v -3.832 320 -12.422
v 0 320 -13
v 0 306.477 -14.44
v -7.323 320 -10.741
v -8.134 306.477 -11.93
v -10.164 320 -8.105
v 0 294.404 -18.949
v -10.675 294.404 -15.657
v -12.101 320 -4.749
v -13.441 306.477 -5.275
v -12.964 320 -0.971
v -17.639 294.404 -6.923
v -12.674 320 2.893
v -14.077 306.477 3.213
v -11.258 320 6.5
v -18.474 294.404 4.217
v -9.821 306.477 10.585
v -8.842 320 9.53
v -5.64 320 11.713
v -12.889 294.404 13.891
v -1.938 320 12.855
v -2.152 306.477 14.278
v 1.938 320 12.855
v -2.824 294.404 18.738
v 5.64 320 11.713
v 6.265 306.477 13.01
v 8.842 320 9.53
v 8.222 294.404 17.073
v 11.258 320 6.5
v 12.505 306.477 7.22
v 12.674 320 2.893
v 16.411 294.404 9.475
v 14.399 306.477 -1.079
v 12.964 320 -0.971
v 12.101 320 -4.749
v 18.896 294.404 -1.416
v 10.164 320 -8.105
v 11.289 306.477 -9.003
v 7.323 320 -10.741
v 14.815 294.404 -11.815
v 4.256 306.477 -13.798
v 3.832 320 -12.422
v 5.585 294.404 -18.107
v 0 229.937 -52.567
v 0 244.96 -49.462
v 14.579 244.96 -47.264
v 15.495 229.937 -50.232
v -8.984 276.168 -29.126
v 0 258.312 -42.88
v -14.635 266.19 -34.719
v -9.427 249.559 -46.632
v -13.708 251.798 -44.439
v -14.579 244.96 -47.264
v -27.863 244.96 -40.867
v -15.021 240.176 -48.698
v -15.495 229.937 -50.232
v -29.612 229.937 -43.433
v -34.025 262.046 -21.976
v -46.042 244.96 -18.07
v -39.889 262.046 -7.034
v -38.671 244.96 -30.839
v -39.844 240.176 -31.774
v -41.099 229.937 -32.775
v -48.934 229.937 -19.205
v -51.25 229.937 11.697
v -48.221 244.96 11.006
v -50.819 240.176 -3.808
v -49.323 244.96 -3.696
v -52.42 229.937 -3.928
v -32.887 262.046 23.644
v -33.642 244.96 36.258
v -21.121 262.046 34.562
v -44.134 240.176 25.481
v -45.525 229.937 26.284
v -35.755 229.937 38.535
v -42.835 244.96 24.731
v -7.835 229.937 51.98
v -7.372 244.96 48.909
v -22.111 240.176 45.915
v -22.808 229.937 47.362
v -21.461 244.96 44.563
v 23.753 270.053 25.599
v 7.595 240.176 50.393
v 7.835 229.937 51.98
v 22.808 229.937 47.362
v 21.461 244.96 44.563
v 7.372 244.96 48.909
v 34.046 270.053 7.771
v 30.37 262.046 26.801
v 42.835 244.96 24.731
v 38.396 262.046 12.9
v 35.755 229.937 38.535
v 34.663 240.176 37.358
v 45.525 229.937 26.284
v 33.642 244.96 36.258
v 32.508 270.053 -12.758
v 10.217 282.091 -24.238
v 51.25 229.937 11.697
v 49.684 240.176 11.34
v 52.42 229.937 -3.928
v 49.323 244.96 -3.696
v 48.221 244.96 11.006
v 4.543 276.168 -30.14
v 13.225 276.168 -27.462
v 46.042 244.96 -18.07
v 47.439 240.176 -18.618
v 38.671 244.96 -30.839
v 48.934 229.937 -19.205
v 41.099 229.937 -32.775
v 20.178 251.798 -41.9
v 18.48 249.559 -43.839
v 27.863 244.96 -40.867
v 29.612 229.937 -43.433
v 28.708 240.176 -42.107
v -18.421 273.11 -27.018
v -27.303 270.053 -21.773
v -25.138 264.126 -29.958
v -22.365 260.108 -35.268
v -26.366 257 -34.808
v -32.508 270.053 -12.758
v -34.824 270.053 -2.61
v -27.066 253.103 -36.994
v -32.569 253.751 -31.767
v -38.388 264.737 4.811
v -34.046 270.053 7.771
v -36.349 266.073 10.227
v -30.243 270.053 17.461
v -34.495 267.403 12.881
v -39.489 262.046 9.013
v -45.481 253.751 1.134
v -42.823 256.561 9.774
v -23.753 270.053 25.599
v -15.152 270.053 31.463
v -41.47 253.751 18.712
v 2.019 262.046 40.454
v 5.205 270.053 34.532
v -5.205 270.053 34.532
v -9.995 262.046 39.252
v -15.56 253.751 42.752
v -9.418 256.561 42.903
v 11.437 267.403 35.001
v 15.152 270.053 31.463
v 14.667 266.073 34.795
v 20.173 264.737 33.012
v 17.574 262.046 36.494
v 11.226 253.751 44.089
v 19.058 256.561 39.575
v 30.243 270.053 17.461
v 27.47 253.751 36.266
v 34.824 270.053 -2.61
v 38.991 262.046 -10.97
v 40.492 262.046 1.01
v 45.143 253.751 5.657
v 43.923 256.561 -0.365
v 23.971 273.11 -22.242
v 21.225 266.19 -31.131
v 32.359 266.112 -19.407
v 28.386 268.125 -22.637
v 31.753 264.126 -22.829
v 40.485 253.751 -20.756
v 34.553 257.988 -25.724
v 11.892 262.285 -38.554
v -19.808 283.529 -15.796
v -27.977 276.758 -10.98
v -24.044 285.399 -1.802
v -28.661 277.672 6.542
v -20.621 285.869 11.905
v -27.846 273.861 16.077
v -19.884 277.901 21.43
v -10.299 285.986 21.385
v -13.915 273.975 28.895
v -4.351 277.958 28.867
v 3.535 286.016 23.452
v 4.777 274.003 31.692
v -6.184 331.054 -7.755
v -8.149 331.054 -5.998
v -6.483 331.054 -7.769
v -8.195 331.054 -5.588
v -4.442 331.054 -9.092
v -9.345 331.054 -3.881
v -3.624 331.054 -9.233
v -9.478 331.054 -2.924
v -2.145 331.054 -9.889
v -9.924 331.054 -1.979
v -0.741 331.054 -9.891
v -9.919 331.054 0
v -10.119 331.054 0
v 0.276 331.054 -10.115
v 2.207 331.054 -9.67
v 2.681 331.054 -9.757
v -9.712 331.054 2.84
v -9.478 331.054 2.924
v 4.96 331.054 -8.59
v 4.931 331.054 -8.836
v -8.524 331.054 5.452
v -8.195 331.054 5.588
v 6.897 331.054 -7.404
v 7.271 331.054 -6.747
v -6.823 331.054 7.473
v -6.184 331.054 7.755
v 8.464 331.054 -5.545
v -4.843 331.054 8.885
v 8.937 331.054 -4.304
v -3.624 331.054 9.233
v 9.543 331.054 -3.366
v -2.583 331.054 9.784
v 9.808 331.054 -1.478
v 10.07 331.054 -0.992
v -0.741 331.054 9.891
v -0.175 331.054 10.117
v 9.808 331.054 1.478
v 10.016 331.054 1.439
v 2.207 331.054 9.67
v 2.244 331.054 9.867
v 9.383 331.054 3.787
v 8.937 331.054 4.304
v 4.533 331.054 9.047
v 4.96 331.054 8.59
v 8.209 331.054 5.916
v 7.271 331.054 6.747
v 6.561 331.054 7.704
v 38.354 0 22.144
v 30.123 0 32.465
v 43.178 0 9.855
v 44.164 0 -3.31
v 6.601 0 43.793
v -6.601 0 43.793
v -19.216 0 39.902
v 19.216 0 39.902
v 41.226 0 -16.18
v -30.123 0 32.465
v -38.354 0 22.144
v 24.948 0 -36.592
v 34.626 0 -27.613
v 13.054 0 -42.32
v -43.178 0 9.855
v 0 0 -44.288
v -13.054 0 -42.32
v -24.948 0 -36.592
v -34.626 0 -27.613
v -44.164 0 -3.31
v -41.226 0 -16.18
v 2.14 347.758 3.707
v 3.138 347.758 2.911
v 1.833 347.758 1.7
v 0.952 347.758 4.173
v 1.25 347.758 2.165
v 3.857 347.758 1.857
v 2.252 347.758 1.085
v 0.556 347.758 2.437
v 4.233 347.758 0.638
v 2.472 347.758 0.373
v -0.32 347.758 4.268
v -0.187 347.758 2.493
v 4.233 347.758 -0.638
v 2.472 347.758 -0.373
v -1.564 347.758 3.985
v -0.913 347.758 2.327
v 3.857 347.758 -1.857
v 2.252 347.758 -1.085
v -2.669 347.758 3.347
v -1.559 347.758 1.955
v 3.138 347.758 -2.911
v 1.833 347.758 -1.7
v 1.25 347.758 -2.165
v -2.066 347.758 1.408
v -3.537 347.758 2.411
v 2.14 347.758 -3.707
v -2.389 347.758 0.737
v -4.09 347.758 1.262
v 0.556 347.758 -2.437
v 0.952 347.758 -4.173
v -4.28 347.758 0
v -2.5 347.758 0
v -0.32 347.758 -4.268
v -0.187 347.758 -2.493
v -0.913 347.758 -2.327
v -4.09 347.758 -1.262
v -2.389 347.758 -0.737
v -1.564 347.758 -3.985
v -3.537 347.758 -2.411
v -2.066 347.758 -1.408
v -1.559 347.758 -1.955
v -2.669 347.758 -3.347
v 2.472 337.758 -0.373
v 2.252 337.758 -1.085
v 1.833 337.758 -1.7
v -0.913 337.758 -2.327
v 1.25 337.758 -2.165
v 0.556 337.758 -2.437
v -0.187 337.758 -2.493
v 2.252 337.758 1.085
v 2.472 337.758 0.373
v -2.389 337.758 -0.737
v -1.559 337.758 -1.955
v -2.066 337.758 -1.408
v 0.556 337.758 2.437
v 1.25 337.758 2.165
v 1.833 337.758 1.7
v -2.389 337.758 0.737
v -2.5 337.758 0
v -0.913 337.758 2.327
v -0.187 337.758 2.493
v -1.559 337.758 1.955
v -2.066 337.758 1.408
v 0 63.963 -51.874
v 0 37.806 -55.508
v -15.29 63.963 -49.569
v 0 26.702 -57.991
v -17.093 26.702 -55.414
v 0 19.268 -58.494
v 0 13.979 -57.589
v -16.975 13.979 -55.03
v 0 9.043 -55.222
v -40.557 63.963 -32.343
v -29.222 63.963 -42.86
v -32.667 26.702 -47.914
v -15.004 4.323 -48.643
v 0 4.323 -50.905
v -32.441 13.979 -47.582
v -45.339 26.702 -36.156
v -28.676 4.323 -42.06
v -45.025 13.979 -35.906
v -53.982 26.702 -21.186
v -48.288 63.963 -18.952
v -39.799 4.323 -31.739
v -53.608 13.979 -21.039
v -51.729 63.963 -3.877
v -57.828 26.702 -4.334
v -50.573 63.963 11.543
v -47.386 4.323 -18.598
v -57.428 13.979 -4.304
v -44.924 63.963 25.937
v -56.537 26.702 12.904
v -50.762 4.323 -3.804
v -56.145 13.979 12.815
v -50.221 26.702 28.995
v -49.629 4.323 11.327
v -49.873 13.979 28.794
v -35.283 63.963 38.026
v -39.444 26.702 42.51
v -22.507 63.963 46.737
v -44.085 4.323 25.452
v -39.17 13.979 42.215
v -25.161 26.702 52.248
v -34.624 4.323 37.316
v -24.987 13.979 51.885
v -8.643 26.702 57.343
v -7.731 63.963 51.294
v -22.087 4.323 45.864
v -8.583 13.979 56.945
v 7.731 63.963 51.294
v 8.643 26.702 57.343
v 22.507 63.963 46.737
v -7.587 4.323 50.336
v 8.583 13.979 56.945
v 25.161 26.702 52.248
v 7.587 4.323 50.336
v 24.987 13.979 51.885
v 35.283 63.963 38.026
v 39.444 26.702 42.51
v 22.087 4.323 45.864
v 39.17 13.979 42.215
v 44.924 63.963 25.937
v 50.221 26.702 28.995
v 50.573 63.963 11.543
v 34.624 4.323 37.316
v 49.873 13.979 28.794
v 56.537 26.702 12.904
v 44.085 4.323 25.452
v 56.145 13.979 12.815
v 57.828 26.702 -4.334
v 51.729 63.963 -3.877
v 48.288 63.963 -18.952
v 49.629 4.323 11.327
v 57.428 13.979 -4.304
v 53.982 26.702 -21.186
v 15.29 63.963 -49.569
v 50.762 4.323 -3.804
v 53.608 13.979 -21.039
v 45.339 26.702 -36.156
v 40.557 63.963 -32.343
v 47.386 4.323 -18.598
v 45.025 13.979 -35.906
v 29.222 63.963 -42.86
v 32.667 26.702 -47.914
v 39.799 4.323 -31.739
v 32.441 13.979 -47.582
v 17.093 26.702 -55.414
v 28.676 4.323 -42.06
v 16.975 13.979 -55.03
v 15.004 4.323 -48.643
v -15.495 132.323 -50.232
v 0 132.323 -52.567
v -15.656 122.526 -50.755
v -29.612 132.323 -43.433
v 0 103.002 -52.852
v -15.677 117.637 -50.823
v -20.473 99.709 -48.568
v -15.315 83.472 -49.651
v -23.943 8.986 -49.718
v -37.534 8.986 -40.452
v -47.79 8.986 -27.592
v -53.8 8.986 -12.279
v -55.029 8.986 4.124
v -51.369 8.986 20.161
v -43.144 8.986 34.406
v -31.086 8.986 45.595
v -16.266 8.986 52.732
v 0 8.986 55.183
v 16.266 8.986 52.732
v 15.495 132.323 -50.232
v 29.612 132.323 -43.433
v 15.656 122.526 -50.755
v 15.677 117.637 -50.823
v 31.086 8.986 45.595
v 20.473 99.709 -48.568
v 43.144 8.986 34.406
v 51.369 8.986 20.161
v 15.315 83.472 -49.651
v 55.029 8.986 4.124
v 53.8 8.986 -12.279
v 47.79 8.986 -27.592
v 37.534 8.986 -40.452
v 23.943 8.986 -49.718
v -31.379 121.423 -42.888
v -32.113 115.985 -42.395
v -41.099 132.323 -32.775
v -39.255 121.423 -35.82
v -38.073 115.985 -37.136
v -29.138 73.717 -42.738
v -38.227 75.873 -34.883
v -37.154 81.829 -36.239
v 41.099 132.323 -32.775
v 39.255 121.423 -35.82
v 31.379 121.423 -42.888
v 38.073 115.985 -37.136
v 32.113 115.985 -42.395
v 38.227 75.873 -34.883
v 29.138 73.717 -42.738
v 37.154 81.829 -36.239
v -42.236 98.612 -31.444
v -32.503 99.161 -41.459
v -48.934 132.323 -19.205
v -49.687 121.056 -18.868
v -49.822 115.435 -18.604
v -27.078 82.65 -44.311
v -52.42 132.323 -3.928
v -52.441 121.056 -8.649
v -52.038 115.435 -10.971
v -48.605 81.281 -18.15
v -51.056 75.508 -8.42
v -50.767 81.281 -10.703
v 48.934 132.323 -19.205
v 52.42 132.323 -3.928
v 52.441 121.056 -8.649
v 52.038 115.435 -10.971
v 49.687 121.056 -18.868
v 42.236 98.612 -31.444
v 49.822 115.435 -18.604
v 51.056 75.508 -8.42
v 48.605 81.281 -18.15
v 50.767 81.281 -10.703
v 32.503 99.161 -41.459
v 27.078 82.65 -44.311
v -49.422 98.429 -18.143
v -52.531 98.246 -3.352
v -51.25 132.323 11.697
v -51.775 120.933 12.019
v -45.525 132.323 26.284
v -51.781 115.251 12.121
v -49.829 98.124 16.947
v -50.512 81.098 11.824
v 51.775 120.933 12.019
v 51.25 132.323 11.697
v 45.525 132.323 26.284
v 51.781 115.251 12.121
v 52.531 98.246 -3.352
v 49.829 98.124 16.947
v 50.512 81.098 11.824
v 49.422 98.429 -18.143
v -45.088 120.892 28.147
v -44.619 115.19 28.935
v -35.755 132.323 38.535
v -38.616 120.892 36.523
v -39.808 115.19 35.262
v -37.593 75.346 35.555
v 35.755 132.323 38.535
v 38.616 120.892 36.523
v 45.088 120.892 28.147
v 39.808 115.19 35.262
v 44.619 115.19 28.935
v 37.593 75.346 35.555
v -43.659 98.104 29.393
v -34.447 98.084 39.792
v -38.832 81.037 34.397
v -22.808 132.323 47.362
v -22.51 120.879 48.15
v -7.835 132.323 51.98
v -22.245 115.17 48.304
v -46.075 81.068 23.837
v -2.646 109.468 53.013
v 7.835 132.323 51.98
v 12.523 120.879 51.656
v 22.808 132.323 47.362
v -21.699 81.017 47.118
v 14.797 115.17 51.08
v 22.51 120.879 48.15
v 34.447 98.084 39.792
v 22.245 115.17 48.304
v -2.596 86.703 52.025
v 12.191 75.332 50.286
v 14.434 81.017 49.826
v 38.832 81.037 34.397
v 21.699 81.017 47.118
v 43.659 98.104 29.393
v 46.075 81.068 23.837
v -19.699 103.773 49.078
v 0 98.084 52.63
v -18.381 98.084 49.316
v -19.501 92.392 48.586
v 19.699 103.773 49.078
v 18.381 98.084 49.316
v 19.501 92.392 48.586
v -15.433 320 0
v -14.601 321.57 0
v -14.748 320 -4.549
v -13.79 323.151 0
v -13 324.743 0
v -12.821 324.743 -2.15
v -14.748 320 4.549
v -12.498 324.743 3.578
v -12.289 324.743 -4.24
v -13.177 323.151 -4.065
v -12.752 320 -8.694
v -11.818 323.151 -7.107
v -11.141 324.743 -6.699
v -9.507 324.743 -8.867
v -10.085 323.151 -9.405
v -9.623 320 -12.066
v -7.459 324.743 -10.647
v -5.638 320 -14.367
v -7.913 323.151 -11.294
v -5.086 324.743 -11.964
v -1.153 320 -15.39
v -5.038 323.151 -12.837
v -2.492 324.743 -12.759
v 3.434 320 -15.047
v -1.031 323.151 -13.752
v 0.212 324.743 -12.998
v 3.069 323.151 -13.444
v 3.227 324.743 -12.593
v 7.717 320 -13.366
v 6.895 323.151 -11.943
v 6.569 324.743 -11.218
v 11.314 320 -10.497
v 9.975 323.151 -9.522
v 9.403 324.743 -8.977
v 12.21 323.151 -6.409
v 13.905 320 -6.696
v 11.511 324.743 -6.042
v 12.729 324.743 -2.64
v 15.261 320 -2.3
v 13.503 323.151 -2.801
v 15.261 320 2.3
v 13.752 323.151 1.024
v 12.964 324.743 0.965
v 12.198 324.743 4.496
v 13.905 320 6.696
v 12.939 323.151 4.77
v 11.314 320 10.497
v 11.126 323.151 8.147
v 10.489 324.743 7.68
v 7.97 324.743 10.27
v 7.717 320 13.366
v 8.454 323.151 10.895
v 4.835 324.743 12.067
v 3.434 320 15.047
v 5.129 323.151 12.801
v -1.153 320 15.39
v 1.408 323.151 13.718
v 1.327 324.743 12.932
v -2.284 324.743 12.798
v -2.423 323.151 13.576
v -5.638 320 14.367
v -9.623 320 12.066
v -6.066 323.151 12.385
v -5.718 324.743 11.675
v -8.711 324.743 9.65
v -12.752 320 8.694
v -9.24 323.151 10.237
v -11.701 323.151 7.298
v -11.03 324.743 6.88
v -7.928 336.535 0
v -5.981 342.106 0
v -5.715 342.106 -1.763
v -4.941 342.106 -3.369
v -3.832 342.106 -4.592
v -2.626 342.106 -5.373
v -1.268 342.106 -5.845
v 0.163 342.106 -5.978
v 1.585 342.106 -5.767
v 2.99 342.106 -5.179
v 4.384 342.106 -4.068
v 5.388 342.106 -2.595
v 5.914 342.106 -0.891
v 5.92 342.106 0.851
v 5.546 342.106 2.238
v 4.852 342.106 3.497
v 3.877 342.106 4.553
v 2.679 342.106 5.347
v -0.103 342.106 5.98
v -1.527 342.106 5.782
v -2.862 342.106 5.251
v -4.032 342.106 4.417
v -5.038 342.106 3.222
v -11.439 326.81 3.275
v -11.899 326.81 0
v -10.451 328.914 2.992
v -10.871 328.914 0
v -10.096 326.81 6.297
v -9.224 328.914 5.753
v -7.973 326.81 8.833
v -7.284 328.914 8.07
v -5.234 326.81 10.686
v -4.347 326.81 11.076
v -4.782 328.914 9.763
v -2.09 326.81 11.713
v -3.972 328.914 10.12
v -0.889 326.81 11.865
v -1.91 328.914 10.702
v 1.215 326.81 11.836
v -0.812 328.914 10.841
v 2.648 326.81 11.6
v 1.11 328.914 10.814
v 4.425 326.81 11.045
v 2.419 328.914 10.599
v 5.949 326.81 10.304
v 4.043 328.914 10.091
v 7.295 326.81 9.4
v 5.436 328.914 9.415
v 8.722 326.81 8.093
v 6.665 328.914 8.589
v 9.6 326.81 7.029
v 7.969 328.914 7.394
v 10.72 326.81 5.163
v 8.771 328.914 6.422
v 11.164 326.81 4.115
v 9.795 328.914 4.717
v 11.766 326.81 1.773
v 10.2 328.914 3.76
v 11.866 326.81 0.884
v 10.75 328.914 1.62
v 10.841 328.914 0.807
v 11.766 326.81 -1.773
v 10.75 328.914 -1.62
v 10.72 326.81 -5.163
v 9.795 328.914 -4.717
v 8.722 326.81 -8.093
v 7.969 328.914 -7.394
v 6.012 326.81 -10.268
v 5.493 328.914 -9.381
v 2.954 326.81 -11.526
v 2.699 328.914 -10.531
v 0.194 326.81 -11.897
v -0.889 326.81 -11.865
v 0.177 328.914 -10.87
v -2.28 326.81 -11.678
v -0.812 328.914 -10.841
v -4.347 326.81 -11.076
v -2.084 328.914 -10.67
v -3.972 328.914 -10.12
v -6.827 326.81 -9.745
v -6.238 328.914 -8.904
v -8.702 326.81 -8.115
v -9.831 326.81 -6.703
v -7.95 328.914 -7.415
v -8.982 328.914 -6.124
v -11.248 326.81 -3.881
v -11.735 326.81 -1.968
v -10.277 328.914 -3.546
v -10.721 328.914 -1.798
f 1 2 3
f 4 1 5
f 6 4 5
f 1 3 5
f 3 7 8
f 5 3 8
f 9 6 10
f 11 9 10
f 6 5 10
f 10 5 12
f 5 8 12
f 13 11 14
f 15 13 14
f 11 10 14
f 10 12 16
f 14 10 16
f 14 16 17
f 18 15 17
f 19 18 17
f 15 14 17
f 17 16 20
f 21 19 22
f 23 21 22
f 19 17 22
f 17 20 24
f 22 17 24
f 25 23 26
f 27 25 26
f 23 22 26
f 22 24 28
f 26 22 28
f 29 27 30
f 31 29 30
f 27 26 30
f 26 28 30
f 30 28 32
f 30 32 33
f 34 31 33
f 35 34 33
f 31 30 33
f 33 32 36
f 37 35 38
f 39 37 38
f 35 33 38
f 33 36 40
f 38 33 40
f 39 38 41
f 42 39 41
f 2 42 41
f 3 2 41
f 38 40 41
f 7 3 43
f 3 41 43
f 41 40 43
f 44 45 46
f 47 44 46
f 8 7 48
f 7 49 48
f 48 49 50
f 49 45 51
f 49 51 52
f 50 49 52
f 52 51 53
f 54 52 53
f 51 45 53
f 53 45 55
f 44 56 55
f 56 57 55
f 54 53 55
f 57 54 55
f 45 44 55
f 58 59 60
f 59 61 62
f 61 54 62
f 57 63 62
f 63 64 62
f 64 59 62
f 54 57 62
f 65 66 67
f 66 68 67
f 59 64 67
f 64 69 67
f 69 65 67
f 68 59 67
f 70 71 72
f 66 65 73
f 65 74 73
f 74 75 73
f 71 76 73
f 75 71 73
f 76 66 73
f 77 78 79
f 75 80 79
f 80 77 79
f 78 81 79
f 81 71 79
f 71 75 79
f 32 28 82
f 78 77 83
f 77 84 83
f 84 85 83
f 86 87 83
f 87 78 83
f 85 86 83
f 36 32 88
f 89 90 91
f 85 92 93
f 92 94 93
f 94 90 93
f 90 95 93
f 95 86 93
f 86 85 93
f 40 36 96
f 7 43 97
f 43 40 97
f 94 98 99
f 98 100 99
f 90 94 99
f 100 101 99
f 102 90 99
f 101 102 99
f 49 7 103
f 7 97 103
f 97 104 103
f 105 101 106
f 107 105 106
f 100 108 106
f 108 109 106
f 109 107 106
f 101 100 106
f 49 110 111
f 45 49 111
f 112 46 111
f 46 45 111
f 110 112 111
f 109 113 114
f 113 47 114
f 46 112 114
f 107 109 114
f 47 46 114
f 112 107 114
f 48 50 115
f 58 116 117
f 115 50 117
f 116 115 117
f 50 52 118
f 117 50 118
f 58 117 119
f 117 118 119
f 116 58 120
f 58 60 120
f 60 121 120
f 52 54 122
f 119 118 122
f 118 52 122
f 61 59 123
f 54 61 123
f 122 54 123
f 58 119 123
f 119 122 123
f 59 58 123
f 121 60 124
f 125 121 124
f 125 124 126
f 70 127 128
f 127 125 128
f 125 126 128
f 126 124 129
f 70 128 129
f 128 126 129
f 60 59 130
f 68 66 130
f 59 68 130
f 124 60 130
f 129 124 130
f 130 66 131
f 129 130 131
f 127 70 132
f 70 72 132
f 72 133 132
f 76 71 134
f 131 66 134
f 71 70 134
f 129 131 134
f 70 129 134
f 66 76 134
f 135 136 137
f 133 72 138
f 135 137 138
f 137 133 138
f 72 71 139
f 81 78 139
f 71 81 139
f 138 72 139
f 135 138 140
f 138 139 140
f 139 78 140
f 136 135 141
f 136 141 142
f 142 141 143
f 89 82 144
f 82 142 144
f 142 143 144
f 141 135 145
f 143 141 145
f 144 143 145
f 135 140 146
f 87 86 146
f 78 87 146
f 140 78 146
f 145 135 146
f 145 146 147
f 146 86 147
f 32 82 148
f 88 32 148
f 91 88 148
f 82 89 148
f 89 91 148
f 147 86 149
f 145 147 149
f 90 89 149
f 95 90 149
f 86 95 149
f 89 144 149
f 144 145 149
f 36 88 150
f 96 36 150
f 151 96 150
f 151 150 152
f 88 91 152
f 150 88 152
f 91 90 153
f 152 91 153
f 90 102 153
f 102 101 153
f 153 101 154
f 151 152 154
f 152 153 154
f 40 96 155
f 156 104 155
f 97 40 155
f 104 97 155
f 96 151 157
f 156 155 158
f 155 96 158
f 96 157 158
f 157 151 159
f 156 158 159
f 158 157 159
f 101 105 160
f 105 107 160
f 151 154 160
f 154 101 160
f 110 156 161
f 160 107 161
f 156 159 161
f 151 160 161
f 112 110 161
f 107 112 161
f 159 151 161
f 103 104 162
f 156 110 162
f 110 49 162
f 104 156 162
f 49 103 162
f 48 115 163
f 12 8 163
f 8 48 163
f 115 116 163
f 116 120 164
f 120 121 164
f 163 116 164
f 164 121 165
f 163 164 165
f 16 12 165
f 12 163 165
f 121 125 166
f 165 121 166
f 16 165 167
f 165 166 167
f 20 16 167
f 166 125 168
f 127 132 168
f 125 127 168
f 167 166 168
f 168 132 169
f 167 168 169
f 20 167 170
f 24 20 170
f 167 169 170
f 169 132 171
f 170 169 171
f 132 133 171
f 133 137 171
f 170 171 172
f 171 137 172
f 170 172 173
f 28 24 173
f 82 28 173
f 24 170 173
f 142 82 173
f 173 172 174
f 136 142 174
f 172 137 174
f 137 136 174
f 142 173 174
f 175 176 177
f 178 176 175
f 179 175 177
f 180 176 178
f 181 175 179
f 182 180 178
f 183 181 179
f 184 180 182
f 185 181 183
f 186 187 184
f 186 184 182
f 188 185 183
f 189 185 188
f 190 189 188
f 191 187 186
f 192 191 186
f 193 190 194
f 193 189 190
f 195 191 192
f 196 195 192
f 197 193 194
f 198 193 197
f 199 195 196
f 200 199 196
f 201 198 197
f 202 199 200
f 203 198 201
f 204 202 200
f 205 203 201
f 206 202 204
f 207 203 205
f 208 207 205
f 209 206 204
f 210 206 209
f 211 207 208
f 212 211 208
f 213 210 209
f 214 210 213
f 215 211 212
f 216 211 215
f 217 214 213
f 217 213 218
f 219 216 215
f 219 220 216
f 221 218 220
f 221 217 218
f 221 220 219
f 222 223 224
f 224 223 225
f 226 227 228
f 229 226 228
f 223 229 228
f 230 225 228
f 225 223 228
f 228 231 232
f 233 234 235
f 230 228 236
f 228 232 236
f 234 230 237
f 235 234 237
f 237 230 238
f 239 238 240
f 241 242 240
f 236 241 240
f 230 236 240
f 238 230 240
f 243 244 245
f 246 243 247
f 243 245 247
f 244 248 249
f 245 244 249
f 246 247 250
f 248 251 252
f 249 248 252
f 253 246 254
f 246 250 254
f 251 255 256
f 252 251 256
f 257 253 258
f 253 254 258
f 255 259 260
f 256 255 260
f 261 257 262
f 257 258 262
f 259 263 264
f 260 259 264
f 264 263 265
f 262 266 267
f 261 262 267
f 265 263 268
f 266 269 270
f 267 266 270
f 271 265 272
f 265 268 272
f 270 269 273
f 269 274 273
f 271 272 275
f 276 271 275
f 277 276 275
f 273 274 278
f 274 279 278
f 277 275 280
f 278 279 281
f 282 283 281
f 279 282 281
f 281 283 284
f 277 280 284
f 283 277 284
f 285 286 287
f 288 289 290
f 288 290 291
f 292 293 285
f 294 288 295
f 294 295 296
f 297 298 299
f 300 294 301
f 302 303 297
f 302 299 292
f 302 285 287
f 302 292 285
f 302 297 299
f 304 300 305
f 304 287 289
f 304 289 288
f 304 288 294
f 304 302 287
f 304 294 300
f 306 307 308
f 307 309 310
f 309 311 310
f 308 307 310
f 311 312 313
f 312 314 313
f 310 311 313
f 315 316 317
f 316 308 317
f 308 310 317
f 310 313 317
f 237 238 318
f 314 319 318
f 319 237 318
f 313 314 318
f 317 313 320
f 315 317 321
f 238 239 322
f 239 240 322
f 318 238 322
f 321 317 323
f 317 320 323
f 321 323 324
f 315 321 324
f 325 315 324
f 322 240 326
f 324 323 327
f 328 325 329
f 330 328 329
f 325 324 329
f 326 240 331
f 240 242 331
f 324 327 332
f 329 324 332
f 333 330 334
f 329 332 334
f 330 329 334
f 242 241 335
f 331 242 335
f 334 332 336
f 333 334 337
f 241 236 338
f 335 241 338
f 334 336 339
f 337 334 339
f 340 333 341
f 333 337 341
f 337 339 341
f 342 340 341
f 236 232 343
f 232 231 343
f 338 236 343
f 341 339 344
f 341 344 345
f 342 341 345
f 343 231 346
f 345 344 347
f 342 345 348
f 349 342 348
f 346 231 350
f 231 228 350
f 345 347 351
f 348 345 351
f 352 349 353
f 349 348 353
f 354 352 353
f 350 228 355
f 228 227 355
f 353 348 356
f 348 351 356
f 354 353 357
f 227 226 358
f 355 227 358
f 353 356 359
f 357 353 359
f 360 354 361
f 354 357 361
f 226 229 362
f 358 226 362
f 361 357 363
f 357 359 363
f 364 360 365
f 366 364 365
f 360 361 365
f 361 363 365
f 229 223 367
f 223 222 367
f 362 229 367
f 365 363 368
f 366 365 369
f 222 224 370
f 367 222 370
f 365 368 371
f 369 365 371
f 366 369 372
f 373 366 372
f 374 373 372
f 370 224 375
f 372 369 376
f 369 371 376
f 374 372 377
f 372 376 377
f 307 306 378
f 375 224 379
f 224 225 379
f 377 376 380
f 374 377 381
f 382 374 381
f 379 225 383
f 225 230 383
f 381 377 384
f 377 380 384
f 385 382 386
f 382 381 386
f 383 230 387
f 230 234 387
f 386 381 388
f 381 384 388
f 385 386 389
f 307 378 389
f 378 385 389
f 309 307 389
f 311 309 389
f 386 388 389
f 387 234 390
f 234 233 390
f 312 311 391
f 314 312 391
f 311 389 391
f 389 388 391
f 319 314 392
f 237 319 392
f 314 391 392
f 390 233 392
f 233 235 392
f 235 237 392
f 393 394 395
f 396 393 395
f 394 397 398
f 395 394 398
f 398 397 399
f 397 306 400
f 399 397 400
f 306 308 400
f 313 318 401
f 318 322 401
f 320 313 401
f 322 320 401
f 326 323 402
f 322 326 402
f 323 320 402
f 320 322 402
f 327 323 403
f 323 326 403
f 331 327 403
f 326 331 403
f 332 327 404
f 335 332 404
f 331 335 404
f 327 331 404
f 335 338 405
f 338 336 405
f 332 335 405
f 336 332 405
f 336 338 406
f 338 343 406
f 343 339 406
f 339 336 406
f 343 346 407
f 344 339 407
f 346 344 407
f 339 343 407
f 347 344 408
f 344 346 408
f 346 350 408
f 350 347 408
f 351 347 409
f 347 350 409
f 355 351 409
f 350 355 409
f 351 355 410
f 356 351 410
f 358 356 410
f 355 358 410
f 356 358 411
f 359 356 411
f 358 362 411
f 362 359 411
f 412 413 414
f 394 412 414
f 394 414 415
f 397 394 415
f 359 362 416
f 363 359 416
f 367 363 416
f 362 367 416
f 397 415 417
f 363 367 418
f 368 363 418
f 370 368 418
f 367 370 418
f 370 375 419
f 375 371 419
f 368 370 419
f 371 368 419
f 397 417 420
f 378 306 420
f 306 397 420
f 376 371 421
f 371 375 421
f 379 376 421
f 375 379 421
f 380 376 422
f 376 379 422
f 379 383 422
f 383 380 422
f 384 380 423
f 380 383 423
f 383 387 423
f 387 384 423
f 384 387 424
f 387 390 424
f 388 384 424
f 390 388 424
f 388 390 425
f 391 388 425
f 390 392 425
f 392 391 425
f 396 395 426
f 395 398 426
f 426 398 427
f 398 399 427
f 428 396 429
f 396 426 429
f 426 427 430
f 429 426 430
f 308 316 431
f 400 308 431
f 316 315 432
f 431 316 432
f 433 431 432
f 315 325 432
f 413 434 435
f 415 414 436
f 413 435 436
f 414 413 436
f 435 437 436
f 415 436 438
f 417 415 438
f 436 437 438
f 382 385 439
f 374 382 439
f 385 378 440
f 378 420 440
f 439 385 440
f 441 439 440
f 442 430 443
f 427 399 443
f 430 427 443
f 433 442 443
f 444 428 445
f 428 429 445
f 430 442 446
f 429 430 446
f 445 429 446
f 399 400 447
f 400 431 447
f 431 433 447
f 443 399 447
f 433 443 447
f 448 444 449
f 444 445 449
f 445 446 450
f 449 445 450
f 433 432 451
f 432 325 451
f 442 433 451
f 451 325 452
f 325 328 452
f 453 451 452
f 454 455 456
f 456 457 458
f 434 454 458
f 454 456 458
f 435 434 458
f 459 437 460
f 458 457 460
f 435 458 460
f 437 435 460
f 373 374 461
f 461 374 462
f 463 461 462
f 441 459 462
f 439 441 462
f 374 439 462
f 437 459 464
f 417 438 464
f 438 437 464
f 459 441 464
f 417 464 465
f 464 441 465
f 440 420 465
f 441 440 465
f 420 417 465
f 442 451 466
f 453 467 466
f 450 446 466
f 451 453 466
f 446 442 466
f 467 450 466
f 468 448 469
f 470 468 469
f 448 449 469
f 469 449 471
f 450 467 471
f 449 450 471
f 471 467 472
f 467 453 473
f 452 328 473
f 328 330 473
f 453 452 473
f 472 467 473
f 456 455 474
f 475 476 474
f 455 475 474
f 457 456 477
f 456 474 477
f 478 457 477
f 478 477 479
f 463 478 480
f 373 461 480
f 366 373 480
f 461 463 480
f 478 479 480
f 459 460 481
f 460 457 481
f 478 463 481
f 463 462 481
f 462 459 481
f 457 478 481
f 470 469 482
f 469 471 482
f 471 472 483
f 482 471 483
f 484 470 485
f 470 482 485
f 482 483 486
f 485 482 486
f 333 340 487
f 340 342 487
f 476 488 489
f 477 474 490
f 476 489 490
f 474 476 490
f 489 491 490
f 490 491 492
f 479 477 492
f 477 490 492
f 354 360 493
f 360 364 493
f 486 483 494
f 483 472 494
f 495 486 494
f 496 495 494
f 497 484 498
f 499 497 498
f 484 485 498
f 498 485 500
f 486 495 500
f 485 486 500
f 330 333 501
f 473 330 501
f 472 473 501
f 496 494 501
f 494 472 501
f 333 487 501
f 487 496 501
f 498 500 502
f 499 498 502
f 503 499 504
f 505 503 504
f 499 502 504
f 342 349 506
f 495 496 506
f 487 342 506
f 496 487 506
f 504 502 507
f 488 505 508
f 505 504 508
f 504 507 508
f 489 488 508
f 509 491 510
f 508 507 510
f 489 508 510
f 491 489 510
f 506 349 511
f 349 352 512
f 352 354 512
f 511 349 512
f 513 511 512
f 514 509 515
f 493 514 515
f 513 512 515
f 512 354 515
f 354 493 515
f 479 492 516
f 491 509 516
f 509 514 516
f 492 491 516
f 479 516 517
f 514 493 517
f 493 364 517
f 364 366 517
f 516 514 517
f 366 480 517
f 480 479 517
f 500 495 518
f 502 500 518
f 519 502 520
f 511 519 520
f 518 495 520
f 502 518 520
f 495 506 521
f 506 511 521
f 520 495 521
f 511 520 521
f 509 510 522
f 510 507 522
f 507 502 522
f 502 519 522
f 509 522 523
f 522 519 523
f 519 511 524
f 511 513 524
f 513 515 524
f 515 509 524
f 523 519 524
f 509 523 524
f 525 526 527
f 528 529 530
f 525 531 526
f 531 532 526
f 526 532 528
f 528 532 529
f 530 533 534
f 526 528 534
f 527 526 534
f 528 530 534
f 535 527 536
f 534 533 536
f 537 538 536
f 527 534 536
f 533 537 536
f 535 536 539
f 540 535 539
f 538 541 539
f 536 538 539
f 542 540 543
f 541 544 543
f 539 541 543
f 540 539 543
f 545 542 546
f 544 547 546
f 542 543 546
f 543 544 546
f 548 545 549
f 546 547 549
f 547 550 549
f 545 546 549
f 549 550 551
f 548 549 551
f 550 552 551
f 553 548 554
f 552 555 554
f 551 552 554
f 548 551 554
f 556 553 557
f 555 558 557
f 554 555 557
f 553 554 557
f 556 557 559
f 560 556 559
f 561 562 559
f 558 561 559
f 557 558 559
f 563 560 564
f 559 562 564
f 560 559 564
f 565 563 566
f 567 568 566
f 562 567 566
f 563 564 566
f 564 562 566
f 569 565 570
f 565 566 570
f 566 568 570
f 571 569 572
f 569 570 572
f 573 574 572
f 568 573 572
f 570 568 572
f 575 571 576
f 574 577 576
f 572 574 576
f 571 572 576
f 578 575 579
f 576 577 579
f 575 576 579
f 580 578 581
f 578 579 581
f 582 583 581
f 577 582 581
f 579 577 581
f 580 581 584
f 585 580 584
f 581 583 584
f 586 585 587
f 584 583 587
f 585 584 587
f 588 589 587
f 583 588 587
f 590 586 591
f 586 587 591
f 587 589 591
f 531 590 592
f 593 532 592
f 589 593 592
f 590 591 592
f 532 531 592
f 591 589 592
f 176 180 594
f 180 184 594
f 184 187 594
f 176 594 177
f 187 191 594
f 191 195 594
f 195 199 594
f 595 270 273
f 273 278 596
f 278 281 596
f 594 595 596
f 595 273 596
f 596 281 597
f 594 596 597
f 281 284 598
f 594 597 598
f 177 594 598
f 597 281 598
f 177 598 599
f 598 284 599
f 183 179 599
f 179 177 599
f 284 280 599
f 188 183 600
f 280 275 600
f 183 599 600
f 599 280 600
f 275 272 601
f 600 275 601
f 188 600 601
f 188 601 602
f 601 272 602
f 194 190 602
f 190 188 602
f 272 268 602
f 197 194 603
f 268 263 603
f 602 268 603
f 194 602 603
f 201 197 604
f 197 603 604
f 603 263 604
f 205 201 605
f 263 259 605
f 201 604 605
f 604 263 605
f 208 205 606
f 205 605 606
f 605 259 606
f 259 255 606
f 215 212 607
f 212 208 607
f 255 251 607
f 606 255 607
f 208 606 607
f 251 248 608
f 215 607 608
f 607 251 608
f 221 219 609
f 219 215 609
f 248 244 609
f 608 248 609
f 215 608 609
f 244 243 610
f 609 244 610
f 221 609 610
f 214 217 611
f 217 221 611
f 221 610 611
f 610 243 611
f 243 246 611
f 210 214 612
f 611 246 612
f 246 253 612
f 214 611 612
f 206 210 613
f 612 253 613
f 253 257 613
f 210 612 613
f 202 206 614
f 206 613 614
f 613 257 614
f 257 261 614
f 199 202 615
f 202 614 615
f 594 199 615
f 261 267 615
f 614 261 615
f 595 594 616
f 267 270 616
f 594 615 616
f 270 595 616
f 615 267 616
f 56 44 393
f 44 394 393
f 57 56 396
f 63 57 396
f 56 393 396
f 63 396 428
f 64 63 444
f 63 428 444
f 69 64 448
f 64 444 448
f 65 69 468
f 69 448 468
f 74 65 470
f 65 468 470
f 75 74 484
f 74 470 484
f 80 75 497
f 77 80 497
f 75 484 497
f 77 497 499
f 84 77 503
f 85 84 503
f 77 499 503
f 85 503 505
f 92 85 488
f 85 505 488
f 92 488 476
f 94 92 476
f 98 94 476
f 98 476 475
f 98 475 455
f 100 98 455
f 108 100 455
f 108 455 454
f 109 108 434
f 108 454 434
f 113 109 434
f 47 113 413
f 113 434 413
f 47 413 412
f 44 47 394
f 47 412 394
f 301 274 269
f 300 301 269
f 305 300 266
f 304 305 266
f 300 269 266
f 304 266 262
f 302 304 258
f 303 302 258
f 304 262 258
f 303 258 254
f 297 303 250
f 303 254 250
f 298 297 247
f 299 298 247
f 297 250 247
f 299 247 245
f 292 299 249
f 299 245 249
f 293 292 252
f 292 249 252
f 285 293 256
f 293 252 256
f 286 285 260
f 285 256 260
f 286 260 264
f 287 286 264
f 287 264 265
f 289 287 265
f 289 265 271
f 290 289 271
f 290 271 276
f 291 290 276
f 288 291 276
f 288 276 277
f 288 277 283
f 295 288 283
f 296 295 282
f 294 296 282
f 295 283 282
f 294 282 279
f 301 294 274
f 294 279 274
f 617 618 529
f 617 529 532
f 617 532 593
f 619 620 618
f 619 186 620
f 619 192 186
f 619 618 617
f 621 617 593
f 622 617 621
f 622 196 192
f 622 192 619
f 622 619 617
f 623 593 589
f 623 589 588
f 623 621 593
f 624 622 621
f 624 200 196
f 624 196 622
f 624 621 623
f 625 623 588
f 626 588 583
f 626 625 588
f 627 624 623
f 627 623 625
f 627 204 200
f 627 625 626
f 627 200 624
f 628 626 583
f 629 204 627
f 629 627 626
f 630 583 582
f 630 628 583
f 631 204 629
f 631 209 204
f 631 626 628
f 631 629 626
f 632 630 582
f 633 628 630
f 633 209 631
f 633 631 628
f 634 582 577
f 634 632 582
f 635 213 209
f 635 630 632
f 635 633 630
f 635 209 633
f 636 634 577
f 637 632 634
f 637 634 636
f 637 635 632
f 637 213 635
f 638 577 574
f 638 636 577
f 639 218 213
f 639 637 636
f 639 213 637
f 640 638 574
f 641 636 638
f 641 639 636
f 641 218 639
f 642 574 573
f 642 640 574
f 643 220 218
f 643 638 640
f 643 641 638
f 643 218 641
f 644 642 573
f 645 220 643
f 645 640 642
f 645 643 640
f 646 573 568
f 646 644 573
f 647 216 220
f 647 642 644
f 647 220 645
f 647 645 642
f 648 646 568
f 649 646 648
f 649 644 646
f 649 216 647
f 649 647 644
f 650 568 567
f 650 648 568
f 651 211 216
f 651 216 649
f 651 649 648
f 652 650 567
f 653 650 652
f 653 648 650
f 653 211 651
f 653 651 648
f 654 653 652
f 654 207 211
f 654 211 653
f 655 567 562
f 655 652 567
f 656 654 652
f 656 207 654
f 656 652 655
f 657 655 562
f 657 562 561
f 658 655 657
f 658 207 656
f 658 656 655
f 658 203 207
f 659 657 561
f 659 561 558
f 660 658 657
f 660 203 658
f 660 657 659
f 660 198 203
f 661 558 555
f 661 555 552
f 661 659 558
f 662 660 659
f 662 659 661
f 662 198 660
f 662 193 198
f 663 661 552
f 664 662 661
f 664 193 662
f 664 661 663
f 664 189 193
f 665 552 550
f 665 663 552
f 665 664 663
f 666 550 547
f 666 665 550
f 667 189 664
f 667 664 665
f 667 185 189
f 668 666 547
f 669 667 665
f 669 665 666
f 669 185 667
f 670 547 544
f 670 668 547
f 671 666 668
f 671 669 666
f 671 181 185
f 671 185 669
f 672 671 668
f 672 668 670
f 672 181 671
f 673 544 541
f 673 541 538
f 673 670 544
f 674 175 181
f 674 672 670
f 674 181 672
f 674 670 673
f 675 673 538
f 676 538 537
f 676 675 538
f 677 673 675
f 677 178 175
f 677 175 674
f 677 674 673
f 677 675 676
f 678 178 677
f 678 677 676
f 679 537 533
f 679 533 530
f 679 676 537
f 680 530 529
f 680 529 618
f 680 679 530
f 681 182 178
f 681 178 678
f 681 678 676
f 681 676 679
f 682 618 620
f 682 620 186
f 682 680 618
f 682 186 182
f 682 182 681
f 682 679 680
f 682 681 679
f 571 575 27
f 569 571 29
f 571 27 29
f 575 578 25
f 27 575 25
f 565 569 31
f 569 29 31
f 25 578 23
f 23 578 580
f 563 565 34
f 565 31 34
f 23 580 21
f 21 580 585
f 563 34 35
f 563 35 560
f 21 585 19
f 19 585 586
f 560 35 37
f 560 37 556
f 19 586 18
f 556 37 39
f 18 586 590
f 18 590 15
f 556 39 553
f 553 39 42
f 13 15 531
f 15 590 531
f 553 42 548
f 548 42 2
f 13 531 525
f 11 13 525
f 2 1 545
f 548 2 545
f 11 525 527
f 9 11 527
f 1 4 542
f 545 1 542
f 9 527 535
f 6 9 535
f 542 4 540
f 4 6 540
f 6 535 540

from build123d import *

# Parameters (mm, degrees)
SKETCH4_R          = 2.5
CUT_EXTRUDE1_DEPTH = 10


with BuildPart() as part:
    # Sketch1 → Revolve1 (revolve)
    with BuildSketch(Plane.XY, mode=Mode.PRIVATE) as revolve1_sk:
        with BuildLine():
            Line((0, 0), (0, 320))
            Line((0, 320), (0, 331.054218753))
            Line((0, 331.054218753), (13, 331.054218753))
            Line((13, 331.054218753), (13, 321.576985446))
            Line((13, 321.576985446), (15.433464657, 320))
            Line((15.433464657, 320), (13, 320))
            add(Edge.make_bspline(
                [(13, 320), (11.878091836, 283.27832547), (50.721966152, 265.475319412), (52.567488524, 229.937180409)],
                knots=[0, 0, 0, 0, 1, 1, 1, 1], degree=3))
            Line((52.567488524, 229.937180409), (52.567488524, 132.323370386))
            add(Edge.make_bspline(
                [(52.567488524, 132.323370386), (55.245477634, 101.880070943), (44.248099594, 56.601355946), (64.997390408, 10.768245845), (44.287893313, 0)],
                knots=[0, 0, 0, 0, 0.662490956, 1, 1, 1, 1], degree=3))
            Line((44.287893313, 0), (0, 0))
        make_face()
    revolve(revolve1_sk.sketch.rotate(Axis((0, 0, 0), (0, 1, 0)), 90), axis=Axis((0, 0, 0), (0, 1, 0)))

    # Sketch2 → Revolve2 (revolve)
    with BuildSketch(Plane.XY, mode=Mode.PRIVATE) as revolve2_sk:
        with BuildLine():
            Line((4.280433448, 347.757883162), (0, 347.757883162))
            Line((0, 347.757883162), (0, 320))
            Line((0, 320), (15.433464657, 320))
            ThreePointArc((15.433464657, 320), (9.079705094, 333.566647373), (4.280433448, 347.757883162))
        make_face()
    revolve(revolve2_sk.sketch.rotate(Axis((0, 347.757883162, 0), (0, -1, 0)), 180), axis=Axis((0, 347.757883162, 0), (0, -1, 0)))

    # Sketch3 → Cut-Revolve1 (revolve, cut)
    with BuildSketch(Plane.XY, mode=Mode.PRIVATE) as cut_revolve1_sk:
        with BuildLine():
            Line((9.919015749, 331.054218753), (13, 331.054218753))
            Line((13, 331.054218753), (13, 324.743018777))
            ThreePointArc((13, 324.743018777), (11.37547872, 327.857597644), (9.919015749, 331.054218753))
        make_face()
    revolve(cut_revolve1_sk.sketch.rotate(Axis((0, 331.054218753, 0), (0, 1, 0)), 180), axis=Axis((0, 331.054218753, 0), (0, 1, 0)), mode=Mode.SUBTRACT)

    # Sketch4 → Cut-Extrude1 (cut)
    with BuildSketch(Plane(origin=(0, 347.757883162, 0), x_dir=(1, 0, 0), z_dir=(0, 1, 0))):
        with Locations(Location((0, 0, 0), (0, 0, 180))):
            Circle(SKETCH4_R)
    extrude(amount=-CUT_EXTRUDE1_DEPTH, mode=Mode.SUBTRACT)


solid = part.part
